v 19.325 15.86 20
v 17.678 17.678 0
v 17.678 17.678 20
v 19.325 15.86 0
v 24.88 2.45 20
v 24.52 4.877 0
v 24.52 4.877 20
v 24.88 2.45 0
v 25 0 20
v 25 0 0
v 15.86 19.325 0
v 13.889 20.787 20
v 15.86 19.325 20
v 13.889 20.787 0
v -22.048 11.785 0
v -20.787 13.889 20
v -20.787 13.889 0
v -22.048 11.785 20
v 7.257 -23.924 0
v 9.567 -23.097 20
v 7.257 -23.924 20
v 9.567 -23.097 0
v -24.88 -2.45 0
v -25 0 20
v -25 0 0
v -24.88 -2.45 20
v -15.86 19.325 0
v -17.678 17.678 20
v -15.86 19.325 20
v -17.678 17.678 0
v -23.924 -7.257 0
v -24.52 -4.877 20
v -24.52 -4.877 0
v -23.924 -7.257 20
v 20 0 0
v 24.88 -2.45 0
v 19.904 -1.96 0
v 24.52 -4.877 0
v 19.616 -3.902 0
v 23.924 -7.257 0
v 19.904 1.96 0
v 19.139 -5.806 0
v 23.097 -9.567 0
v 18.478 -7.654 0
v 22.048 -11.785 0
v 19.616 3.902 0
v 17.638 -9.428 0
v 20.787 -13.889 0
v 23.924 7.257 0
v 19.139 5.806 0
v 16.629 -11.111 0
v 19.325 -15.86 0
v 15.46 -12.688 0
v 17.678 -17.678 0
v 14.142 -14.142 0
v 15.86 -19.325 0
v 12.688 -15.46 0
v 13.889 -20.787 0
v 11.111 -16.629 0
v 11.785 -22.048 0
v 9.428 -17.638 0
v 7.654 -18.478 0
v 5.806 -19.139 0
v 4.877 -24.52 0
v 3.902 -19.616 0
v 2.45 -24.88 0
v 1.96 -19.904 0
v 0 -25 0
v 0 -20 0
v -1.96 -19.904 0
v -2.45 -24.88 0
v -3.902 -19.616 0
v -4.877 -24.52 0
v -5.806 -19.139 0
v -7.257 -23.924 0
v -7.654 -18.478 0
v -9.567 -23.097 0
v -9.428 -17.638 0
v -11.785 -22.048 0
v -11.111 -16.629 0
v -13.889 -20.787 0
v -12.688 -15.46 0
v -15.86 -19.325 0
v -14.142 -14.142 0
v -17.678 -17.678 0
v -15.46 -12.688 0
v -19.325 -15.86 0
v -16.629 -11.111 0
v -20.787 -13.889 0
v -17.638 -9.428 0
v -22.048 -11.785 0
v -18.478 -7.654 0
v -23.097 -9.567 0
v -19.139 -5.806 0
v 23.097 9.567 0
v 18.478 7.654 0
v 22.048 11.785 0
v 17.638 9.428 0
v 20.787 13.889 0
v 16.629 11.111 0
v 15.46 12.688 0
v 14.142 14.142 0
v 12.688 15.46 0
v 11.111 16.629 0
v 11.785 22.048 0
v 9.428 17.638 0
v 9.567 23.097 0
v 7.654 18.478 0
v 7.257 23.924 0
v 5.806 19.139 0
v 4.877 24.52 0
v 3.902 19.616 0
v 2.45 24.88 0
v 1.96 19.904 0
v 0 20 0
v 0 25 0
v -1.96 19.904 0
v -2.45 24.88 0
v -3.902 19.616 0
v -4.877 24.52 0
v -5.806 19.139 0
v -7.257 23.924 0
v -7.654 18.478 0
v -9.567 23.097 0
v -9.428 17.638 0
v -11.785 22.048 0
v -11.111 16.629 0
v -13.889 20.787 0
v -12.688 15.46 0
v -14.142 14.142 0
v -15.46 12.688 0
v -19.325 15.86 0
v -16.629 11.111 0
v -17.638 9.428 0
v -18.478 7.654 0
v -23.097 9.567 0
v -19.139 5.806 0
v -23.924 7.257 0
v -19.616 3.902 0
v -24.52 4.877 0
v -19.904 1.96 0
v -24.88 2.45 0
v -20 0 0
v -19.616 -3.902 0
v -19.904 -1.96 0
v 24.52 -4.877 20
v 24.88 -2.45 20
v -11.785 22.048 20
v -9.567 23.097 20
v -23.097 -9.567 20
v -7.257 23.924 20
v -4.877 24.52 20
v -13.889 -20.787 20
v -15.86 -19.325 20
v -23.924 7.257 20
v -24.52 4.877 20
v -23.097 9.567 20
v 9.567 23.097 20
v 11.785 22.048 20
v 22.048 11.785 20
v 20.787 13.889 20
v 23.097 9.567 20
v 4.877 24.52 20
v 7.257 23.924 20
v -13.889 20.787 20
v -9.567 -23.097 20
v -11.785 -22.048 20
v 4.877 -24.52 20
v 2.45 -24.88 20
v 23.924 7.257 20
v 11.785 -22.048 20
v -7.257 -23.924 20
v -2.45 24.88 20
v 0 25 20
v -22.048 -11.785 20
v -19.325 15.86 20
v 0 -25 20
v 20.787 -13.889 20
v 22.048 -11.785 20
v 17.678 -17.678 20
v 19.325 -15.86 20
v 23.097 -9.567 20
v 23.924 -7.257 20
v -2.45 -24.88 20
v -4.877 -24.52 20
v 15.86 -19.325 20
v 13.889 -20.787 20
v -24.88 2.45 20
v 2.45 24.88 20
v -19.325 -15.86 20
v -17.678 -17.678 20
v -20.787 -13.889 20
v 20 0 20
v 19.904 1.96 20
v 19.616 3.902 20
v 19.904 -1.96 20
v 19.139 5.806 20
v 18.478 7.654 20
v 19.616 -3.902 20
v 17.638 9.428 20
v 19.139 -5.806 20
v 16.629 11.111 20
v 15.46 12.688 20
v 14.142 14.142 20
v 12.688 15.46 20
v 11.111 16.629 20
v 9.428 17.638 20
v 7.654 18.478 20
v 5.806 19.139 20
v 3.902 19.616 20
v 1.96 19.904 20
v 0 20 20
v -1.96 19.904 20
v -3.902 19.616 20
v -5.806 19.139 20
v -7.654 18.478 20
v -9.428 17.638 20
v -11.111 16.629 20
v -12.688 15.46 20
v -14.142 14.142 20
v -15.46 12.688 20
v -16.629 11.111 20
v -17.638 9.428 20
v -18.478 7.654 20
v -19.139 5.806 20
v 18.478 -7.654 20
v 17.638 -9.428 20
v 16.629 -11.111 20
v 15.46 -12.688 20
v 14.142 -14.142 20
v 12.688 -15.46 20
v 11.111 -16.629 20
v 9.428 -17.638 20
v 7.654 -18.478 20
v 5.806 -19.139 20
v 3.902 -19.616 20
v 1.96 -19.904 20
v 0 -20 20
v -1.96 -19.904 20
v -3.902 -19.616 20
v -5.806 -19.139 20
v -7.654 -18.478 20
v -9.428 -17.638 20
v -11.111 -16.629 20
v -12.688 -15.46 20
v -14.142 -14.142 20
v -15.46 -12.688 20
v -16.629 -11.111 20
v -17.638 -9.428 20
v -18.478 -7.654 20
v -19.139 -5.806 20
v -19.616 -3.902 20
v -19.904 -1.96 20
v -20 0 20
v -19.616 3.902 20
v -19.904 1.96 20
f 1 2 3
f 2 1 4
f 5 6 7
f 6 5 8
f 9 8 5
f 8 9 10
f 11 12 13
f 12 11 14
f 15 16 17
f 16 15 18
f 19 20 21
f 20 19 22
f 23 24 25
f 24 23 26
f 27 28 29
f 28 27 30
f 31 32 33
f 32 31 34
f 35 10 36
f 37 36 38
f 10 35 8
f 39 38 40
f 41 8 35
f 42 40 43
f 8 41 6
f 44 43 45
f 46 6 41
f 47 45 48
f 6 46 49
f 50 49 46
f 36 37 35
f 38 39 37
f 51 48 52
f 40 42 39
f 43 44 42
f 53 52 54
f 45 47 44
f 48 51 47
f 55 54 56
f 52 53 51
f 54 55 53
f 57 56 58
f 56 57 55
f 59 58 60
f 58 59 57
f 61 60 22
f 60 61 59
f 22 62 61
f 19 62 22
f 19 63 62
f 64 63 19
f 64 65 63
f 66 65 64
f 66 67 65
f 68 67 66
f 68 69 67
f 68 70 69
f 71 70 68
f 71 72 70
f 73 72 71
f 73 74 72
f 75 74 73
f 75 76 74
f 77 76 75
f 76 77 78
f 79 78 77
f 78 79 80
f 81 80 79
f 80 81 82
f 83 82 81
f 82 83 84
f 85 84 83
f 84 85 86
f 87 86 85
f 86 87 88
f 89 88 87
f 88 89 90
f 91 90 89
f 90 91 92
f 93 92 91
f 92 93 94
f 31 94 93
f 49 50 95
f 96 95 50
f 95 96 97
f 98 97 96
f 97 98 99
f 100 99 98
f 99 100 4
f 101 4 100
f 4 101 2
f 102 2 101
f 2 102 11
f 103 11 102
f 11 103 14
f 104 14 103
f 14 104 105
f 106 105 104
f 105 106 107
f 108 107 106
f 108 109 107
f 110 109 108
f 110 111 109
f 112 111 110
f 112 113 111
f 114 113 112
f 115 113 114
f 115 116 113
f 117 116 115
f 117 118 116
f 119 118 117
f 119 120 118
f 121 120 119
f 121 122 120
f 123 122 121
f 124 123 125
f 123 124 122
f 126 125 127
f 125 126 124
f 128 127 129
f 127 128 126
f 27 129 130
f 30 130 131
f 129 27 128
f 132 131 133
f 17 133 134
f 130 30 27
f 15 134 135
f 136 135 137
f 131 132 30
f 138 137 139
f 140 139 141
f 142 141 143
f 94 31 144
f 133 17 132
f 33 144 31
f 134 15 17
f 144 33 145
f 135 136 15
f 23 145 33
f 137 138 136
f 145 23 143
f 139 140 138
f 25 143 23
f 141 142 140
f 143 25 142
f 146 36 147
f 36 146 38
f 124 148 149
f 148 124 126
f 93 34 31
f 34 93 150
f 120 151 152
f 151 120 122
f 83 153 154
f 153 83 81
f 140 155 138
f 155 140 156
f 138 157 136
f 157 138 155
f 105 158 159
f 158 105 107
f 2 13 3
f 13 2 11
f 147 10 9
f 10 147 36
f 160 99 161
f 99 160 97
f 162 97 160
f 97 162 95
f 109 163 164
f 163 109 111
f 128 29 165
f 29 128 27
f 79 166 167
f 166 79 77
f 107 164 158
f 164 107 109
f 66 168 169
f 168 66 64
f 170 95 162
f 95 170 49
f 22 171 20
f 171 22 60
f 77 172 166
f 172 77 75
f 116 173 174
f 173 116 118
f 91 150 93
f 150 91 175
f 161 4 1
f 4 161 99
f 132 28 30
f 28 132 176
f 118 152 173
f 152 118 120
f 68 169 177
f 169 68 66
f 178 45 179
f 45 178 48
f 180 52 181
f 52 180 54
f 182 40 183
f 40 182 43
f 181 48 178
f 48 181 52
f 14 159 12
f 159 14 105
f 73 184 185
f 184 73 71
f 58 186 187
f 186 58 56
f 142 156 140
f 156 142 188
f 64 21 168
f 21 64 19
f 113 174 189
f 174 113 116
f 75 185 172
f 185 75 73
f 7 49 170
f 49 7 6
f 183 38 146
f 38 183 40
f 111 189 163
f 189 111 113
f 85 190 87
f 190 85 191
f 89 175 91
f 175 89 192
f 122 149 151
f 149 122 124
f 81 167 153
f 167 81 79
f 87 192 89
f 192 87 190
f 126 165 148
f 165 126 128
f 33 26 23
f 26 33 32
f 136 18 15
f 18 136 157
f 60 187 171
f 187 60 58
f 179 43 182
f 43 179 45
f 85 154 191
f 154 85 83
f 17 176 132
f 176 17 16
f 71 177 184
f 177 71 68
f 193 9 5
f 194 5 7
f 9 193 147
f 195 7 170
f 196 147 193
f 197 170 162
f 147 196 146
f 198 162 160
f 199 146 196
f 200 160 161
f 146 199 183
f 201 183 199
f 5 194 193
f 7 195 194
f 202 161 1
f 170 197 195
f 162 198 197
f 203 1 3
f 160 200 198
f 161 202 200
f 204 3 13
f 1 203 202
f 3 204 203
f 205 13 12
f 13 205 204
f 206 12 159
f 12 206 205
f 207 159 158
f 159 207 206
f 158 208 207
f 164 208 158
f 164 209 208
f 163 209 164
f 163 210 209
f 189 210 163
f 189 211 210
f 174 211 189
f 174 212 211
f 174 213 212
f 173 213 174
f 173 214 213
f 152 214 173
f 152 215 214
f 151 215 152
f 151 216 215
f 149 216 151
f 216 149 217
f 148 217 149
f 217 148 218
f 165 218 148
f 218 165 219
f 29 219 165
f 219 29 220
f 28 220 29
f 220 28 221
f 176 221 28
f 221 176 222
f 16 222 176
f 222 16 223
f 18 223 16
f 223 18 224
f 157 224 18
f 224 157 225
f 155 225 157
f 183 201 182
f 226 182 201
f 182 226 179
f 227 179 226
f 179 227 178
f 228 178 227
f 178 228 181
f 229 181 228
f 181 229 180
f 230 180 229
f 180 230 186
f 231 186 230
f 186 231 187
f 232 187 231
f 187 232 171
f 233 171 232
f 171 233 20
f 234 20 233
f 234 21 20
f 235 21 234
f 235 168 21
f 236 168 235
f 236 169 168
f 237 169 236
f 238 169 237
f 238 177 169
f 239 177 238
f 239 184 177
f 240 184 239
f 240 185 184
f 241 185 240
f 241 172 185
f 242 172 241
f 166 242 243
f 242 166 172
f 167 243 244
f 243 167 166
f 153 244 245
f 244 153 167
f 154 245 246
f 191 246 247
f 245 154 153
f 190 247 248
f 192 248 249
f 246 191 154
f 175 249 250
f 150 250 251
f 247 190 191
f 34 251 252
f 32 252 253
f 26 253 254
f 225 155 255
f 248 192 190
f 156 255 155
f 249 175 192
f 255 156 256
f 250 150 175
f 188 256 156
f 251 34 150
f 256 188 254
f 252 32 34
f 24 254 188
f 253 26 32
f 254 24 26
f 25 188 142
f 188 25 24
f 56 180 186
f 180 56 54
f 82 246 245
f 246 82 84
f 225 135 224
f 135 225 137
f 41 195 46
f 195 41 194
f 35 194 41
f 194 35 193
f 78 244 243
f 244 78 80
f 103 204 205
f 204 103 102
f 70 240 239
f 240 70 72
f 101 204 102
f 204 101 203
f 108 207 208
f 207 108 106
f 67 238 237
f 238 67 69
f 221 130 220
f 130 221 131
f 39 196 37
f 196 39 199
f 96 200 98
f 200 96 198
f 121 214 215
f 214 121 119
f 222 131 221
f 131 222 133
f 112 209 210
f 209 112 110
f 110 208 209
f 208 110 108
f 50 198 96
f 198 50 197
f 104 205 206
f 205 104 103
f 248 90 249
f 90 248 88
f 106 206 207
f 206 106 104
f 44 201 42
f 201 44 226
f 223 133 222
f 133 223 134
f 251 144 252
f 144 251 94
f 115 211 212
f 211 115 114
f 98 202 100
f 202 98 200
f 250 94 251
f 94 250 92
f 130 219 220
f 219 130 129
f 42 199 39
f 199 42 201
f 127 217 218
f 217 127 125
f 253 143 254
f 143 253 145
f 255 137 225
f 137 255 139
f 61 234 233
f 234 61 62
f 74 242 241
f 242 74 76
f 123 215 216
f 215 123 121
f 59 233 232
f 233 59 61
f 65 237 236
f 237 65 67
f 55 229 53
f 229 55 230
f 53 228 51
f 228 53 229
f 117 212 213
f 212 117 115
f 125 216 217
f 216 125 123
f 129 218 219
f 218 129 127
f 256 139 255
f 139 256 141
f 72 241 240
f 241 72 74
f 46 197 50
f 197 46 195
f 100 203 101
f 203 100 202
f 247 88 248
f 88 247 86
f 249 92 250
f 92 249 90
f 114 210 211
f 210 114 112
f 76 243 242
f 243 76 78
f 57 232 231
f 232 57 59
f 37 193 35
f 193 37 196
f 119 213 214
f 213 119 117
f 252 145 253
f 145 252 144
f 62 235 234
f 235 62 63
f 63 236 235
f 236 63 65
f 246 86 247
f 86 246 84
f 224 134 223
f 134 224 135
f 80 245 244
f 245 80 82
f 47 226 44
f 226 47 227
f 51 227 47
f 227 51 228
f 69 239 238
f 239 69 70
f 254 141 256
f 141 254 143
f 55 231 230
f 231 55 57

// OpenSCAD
module sellotape_tape() {
    difference() {
        cylinder(h=20, r=25, $fn=64);
        translate([0, 0, -1])
            cylinder(h=22, r=20, $fn=64);
    }
}

sellotape_tape();
